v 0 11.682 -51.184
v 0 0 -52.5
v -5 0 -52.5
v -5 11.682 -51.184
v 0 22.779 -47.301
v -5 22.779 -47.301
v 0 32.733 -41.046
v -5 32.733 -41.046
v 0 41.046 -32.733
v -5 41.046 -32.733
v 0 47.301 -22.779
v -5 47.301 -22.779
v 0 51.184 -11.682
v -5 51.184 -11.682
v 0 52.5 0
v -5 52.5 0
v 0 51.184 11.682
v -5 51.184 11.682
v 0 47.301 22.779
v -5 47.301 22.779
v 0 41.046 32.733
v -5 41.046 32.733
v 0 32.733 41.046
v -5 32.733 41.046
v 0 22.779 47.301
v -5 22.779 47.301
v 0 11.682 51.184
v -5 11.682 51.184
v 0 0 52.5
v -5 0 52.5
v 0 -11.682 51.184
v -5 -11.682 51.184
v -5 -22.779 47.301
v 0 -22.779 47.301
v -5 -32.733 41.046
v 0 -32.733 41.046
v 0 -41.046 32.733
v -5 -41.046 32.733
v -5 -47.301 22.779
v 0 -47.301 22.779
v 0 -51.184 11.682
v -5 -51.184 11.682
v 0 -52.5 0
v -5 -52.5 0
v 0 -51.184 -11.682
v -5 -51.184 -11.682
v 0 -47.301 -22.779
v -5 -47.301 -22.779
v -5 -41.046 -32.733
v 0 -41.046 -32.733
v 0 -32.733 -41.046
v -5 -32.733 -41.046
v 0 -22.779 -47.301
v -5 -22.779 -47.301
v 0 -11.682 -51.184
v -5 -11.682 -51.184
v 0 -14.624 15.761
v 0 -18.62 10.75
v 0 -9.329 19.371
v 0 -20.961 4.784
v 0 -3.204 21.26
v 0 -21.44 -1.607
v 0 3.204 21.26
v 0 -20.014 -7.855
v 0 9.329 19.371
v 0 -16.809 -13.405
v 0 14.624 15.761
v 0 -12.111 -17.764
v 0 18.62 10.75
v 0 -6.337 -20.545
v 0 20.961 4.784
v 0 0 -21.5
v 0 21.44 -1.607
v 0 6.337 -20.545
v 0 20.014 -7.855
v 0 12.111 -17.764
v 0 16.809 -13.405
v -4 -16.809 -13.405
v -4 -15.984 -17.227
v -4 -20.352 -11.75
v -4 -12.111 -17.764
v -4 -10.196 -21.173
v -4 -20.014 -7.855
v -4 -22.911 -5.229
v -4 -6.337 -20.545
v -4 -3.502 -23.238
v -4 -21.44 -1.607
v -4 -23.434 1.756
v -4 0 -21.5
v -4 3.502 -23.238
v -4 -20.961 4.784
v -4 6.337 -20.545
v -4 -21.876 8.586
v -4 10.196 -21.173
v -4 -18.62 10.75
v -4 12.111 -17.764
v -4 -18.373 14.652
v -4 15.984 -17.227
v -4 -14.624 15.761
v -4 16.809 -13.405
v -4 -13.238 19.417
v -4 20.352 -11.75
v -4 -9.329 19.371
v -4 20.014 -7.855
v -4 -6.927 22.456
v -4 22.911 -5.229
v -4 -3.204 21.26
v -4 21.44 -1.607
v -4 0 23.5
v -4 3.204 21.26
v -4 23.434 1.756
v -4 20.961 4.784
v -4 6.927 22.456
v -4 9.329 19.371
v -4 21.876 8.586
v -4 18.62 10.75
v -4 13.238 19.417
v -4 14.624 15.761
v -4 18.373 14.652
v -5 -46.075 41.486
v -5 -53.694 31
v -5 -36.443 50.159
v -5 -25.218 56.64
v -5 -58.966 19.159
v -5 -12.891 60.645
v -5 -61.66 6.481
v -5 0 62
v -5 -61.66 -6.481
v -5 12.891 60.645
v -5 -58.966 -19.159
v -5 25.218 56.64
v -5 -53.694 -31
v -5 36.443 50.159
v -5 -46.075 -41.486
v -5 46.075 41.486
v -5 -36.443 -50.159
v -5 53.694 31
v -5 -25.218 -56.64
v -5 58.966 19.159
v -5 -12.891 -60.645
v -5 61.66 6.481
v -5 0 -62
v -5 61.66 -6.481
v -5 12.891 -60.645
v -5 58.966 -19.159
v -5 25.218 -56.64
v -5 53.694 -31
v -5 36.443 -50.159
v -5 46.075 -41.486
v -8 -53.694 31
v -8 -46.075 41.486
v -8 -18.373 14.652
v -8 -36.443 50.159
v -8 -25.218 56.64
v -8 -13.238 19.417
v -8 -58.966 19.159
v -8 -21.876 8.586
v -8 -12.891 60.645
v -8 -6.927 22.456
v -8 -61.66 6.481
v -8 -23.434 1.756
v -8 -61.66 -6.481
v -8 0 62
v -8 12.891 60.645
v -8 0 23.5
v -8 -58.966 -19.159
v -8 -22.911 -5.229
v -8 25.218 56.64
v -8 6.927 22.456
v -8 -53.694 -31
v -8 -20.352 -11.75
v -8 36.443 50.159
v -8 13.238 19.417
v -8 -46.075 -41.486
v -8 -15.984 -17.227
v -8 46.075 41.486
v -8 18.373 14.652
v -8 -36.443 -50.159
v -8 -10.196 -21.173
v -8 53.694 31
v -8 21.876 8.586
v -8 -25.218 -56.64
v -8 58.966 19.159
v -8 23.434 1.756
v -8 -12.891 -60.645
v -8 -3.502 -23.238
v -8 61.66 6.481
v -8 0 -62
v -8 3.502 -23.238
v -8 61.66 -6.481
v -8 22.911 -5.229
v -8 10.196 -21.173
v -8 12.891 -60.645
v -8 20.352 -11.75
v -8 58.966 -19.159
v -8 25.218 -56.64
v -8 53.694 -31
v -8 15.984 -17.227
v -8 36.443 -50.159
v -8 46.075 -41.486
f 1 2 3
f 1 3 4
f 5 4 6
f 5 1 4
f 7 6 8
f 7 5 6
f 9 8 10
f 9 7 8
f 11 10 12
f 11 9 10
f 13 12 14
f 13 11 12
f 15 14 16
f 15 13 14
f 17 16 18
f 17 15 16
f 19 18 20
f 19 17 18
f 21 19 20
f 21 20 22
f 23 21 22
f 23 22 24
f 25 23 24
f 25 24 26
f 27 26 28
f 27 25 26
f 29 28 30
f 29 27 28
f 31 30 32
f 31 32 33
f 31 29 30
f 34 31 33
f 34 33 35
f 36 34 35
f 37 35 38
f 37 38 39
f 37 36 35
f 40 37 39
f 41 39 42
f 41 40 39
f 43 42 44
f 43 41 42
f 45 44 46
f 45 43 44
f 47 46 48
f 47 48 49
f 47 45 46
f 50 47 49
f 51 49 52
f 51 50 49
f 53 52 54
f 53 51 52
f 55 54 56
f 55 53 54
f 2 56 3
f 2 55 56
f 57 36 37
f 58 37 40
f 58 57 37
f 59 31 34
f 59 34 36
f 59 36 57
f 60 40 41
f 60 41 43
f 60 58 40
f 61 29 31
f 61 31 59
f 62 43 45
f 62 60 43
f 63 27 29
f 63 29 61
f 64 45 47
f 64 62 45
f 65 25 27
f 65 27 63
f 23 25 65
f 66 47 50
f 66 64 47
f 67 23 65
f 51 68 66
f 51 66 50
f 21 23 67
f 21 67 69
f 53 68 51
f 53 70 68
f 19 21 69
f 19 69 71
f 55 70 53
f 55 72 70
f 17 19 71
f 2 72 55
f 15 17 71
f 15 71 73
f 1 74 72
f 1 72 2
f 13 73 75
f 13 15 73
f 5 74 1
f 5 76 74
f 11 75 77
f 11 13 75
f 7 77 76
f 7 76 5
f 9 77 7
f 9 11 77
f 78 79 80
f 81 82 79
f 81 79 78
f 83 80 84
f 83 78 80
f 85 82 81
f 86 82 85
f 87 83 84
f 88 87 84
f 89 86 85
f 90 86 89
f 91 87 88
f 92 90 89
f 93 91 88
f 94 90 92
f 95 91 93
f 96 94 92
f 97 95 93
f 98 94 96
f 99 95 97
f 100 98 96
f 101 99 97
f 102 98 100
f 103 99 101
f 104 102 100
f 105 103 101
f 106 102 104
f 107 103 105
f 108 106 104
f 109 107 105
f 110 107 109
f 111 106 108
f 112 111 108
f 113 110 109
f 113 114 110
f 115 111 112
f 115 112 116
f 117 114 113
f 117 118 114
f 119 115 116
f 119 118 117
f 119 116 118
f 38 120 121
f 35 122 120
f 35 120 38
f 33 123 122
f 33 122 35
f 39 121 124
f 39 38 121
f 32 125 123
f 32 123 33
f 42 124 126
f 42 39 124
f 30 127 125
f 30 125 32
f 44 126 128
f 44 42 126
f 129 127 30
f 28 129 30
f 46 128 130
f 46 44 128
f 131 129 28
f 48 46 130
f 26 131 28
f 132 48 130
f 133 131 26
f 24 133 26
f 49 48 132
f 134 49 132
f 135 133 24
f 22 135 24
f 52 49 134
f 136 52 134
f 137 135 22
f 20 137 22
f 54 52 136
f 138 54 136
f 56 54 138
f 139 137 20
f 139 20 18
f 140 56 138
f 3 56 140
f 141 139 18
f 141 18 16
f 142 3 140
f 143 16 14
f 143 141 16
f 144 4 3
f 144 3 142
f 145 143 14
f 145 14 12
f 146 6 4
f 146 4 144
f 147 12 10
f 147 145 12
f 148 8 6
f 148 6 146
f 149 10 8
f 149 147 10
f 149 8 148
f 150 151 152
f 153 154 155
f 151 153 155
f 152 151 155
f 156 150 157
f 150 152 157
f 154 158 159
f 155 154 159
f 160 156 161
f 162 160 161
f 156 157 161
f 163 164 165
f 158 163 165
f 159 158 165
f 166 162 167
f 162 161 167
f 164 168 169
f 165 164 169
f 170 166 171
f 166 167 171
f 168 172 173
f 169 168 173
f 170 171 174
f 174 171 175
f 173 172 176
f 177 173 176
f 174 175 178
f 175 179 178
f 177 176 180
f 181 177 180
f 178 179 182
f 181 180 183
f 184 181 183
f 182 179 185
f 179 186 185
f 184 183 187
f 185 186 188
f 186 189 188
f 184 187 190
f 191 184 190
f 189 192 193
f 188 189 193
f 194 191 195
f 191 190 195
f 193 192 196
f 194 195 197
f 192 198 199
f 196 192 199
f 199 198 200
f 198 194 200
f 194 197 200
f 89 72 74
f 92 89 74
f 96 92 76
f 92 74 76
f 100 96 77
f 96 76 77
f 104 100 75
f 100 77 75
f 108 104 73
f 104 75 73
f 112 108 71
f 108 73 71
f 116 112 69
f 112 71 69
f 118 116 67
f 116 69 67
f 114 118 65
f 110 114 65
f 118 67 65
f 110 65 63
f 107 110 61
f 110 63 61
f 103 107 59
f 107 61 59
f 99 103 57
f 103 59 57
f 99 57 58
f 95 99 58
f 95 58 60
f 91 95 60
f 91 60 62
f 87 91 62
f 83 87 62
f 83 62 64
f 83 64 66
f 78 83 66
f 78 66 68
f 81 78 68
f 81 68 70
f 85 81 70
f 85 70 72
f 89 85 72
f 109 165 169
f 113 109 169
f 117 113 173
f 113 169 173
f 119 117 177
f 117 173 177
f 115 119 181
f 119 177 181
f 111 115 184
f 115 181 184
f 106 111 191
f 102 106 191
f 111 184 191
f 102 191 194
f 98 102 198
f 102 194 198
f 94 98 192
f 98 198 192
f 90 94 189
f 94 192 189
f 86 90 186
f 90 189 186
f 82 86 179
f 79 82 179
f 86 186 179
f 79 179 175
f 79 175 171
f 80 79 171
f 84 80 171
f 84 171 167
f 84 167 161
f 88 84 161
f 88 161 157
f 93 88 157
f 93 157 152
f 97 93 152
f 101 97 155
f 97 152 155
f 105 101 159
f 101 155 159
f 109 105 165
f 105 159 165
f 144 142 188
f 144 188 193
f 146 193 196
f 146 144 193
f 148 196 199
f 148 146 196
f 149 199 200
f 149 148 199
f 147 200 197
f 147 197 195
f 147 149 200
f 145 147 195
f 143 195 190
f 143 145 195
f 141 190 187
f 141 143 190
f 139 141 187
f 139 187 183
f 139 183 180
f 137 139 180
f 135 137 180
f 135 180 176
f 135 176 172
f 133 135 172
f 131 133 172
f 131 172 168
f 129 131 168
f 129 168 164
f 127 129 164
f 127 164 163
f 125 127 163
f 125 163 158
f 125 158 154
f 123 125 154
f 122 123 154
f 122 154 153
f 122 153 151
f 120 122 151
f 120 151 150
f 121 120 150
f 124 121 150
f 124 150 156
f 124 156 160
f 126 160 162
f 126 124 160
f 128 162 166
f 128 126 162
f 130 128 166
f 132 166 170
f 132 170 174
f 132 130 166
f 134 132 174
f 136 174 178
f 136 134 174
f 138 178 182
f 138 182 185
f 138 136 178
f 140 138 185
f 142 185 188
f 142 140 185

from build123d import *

# Parameters (mm, degrees)
CROQUIS11_R             = 62
CROQUIS11_R_2           = 20
SALIENTE_EXTRUIR3_DEPTH = 8
CROQUIS15_R             = 21.5
CORTAR_EXTRUIR4_DEPTH   = 89.045442812
CROQUIS16_R             = 23.5
CORTAR_EXTRUIR5_DEPTH   = 4
CROQUIS21_R             = 62
CROQUIS21_R_2           = 52.5
CORTAR_EXTRUIR10_DEPTH  = 5


with BuildPart() as part:
    # Croquis11 → Saliente-Extruir3 (new body)
    with BuildSketch(Plane(origin=(0, 0, 0), x_dir=(0, 0, -1), z_dir=(1, 0, 0))):
        Circle(CROQUIS11_R)
        Circle(CROQUIS11_R_2, mode=Mode.SUBTRACT)
    extrude(amount=-SALIENTE_EXTRUIR3_DEPTH)

    # Croquis15 → Cortar-Extruir4 (cut, through all)
    with BuildSketch(Plane(origin=(0, 0, 0), x_dir=(0, 0, -1), z_dir=(1, 0, 0))):
        Circle(CROQUIS15_R)
    extrude(amount=-CORTAR_EXTRUIR4_DEPTH, mode=Mode.SUBTRACT)

    # Croquis16 → Cortar-Extruir5 (cut)
    with BuildSketch(Plane.ZY.offset(8)):
        Circle(CROQUIS16_R)
    extrude(amount=-CORTAR_EXTRUIR5_DEPTH, mode=Mode.SUBTRACT)

    # Croquis21 → Cortar-Extruir10 (cut)
    with BuildSketch(Plane(origin=(0, 0, 0), x_dir=(0, 0, -1), z_dir=(1, 0, 0))):
        Circle(CROQUIS21_R)
        Circle(CROQUIS21_R_2, mode=Mode.SUBTRACT)
    extrude(amount=-CORTAR_EXTRUIR10_DEPTH, mode=Mode.SUBTRACT)


solid = part.part
